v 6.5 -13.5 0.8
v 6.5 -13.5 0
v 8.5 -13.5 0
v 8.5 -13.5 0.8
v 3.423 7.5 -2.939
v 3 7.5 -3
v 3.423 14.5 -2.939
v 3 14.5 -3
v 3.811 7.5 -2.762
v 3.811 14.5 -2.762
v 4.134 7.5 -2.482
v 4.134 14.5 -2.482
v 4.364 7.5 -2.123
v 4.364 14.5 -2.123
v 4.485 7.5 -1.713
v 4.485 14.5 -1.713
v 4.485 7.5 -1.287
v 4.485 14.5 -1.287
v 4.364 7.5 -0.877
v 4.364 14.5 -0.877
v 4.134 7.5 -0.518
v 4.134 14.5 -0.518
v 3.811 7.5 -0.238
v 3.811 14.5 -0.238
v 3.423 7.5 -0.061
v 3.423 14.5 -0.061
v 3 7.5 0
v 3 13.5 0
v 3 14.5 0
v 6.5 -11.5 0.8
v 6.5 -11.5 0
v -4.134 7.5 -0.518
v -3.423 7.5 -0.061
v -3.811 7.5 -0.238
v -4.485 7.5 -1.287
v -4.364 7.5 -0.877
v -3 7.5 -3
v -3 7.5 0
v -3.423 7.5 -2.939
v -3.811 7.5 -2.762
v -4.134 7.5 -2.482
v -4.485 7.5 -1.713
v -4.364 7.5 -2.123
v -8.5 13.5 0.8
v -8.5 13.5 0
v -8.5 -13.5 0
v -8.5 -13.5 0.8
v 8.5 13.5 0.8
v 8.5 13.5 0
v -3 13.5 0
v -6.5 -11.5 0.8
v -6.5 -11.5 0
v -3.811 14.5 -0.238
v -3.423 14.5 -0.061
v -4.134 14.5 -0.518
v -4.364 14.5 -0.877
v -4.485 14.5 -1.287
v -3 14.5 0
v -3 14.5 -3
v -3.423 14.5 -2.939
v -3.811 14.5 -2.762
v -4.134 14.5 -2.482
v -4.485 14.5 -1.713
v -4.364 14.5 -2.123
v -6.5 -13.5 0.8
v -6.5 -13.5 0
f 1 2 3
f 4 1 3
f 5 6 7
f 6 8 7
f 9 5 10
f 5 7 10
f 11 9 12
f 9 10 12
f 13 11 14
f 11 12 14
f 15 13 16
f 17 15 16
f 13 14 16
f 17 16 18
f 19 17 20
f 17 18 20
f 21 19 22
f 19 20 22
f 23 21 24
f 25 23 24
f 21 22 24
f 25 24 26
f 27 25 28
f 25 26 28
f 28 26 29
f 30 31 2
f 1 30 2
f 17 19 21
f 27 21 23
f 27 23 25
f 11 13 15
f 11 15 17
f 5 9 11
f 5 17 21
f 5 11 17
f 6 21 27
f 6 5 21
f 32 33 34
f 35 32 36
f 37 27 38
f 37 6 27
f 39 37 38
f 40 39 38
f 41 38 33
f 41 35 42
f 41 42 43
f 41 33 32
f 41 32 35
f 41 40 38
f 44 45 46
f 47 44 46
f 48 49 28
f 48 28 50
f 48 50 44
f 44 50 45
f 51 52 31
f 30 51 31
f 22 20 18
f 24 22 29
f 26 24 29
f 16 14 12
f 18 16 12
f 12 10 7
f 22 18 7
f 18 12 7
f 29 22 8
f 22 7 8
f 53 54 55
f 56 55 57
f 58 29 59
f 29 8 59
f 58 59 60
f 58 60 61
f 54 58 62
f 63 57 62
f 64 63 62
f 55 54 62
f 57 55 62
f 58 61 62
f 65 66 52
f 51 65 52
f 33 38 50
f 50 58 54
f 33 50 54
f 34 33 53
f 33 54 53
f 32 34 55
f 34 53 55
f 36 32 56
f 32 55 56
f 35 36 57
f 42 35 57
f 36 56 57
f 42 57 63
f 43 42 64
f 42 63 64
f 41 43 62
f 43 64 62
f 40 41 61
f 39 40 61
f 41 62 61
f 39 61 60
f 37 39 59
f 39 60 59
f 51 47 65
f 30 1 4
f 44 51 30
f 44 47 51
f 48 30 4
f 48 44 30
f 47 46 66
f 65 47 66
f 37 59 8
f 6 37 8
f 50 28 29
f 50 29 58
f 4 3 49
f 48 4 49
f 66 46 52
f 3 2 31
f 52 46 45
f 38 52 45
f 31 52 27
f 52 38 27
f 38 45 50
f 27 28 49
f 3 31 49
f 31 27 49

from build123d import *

# Parameters (mm, degrees)
RESSALTO_EXTRUS_O1_DEPTH      = 0.8
RESSALTO_EXTRUS_O2_DEPTH      = 1
RESSALTO_EXTRUS_O2_DEPTH_BACK = 6


with BuildPart() as part:
    # Esboço1 → Ressalto-extrusão1 (new body)
    with BuildSketch(Plane.XY):
        Polygon((8.5, 13.5), (-8.5, 13.5), (-8.5, -13.5), (-6.5, -13.5), (-6.5, -11.5), (6.5, -11.5), (6.5, -13.5), (8.5, -13.5), align=None)
    extrude(amount=RESSALTO_EXTRUS_O1_DEPTH)

    # Esboço3 → Ressalto-extrusão2 (add, two sides)
    with BuildSketch(Plane(origin=(0, 13.5, 0), x_dir=(1, 0, 0), z_dir=(0, 1, 0))) as ressalto_extrus_o2_sk:
        with BuildLine():
            Line((-3, 3), (3, 3))
            ThreePointArc((3, 3), (4.5, 1.5), (3, 0))
            Line((3, 0), (-3, 0))
            ThreePointArc((-3, 0), (-4.5, 1.5), (-3, 3))
        make_face()
    extrude(amount=RESSALTO_EXTRUS_O2_DEPTH)
    extrude(ressalto_extrus_o2_sk.sketch, amount=-RESSALTO_EXTRUS_O2_DEPTH_BACK)


solid = part.part
